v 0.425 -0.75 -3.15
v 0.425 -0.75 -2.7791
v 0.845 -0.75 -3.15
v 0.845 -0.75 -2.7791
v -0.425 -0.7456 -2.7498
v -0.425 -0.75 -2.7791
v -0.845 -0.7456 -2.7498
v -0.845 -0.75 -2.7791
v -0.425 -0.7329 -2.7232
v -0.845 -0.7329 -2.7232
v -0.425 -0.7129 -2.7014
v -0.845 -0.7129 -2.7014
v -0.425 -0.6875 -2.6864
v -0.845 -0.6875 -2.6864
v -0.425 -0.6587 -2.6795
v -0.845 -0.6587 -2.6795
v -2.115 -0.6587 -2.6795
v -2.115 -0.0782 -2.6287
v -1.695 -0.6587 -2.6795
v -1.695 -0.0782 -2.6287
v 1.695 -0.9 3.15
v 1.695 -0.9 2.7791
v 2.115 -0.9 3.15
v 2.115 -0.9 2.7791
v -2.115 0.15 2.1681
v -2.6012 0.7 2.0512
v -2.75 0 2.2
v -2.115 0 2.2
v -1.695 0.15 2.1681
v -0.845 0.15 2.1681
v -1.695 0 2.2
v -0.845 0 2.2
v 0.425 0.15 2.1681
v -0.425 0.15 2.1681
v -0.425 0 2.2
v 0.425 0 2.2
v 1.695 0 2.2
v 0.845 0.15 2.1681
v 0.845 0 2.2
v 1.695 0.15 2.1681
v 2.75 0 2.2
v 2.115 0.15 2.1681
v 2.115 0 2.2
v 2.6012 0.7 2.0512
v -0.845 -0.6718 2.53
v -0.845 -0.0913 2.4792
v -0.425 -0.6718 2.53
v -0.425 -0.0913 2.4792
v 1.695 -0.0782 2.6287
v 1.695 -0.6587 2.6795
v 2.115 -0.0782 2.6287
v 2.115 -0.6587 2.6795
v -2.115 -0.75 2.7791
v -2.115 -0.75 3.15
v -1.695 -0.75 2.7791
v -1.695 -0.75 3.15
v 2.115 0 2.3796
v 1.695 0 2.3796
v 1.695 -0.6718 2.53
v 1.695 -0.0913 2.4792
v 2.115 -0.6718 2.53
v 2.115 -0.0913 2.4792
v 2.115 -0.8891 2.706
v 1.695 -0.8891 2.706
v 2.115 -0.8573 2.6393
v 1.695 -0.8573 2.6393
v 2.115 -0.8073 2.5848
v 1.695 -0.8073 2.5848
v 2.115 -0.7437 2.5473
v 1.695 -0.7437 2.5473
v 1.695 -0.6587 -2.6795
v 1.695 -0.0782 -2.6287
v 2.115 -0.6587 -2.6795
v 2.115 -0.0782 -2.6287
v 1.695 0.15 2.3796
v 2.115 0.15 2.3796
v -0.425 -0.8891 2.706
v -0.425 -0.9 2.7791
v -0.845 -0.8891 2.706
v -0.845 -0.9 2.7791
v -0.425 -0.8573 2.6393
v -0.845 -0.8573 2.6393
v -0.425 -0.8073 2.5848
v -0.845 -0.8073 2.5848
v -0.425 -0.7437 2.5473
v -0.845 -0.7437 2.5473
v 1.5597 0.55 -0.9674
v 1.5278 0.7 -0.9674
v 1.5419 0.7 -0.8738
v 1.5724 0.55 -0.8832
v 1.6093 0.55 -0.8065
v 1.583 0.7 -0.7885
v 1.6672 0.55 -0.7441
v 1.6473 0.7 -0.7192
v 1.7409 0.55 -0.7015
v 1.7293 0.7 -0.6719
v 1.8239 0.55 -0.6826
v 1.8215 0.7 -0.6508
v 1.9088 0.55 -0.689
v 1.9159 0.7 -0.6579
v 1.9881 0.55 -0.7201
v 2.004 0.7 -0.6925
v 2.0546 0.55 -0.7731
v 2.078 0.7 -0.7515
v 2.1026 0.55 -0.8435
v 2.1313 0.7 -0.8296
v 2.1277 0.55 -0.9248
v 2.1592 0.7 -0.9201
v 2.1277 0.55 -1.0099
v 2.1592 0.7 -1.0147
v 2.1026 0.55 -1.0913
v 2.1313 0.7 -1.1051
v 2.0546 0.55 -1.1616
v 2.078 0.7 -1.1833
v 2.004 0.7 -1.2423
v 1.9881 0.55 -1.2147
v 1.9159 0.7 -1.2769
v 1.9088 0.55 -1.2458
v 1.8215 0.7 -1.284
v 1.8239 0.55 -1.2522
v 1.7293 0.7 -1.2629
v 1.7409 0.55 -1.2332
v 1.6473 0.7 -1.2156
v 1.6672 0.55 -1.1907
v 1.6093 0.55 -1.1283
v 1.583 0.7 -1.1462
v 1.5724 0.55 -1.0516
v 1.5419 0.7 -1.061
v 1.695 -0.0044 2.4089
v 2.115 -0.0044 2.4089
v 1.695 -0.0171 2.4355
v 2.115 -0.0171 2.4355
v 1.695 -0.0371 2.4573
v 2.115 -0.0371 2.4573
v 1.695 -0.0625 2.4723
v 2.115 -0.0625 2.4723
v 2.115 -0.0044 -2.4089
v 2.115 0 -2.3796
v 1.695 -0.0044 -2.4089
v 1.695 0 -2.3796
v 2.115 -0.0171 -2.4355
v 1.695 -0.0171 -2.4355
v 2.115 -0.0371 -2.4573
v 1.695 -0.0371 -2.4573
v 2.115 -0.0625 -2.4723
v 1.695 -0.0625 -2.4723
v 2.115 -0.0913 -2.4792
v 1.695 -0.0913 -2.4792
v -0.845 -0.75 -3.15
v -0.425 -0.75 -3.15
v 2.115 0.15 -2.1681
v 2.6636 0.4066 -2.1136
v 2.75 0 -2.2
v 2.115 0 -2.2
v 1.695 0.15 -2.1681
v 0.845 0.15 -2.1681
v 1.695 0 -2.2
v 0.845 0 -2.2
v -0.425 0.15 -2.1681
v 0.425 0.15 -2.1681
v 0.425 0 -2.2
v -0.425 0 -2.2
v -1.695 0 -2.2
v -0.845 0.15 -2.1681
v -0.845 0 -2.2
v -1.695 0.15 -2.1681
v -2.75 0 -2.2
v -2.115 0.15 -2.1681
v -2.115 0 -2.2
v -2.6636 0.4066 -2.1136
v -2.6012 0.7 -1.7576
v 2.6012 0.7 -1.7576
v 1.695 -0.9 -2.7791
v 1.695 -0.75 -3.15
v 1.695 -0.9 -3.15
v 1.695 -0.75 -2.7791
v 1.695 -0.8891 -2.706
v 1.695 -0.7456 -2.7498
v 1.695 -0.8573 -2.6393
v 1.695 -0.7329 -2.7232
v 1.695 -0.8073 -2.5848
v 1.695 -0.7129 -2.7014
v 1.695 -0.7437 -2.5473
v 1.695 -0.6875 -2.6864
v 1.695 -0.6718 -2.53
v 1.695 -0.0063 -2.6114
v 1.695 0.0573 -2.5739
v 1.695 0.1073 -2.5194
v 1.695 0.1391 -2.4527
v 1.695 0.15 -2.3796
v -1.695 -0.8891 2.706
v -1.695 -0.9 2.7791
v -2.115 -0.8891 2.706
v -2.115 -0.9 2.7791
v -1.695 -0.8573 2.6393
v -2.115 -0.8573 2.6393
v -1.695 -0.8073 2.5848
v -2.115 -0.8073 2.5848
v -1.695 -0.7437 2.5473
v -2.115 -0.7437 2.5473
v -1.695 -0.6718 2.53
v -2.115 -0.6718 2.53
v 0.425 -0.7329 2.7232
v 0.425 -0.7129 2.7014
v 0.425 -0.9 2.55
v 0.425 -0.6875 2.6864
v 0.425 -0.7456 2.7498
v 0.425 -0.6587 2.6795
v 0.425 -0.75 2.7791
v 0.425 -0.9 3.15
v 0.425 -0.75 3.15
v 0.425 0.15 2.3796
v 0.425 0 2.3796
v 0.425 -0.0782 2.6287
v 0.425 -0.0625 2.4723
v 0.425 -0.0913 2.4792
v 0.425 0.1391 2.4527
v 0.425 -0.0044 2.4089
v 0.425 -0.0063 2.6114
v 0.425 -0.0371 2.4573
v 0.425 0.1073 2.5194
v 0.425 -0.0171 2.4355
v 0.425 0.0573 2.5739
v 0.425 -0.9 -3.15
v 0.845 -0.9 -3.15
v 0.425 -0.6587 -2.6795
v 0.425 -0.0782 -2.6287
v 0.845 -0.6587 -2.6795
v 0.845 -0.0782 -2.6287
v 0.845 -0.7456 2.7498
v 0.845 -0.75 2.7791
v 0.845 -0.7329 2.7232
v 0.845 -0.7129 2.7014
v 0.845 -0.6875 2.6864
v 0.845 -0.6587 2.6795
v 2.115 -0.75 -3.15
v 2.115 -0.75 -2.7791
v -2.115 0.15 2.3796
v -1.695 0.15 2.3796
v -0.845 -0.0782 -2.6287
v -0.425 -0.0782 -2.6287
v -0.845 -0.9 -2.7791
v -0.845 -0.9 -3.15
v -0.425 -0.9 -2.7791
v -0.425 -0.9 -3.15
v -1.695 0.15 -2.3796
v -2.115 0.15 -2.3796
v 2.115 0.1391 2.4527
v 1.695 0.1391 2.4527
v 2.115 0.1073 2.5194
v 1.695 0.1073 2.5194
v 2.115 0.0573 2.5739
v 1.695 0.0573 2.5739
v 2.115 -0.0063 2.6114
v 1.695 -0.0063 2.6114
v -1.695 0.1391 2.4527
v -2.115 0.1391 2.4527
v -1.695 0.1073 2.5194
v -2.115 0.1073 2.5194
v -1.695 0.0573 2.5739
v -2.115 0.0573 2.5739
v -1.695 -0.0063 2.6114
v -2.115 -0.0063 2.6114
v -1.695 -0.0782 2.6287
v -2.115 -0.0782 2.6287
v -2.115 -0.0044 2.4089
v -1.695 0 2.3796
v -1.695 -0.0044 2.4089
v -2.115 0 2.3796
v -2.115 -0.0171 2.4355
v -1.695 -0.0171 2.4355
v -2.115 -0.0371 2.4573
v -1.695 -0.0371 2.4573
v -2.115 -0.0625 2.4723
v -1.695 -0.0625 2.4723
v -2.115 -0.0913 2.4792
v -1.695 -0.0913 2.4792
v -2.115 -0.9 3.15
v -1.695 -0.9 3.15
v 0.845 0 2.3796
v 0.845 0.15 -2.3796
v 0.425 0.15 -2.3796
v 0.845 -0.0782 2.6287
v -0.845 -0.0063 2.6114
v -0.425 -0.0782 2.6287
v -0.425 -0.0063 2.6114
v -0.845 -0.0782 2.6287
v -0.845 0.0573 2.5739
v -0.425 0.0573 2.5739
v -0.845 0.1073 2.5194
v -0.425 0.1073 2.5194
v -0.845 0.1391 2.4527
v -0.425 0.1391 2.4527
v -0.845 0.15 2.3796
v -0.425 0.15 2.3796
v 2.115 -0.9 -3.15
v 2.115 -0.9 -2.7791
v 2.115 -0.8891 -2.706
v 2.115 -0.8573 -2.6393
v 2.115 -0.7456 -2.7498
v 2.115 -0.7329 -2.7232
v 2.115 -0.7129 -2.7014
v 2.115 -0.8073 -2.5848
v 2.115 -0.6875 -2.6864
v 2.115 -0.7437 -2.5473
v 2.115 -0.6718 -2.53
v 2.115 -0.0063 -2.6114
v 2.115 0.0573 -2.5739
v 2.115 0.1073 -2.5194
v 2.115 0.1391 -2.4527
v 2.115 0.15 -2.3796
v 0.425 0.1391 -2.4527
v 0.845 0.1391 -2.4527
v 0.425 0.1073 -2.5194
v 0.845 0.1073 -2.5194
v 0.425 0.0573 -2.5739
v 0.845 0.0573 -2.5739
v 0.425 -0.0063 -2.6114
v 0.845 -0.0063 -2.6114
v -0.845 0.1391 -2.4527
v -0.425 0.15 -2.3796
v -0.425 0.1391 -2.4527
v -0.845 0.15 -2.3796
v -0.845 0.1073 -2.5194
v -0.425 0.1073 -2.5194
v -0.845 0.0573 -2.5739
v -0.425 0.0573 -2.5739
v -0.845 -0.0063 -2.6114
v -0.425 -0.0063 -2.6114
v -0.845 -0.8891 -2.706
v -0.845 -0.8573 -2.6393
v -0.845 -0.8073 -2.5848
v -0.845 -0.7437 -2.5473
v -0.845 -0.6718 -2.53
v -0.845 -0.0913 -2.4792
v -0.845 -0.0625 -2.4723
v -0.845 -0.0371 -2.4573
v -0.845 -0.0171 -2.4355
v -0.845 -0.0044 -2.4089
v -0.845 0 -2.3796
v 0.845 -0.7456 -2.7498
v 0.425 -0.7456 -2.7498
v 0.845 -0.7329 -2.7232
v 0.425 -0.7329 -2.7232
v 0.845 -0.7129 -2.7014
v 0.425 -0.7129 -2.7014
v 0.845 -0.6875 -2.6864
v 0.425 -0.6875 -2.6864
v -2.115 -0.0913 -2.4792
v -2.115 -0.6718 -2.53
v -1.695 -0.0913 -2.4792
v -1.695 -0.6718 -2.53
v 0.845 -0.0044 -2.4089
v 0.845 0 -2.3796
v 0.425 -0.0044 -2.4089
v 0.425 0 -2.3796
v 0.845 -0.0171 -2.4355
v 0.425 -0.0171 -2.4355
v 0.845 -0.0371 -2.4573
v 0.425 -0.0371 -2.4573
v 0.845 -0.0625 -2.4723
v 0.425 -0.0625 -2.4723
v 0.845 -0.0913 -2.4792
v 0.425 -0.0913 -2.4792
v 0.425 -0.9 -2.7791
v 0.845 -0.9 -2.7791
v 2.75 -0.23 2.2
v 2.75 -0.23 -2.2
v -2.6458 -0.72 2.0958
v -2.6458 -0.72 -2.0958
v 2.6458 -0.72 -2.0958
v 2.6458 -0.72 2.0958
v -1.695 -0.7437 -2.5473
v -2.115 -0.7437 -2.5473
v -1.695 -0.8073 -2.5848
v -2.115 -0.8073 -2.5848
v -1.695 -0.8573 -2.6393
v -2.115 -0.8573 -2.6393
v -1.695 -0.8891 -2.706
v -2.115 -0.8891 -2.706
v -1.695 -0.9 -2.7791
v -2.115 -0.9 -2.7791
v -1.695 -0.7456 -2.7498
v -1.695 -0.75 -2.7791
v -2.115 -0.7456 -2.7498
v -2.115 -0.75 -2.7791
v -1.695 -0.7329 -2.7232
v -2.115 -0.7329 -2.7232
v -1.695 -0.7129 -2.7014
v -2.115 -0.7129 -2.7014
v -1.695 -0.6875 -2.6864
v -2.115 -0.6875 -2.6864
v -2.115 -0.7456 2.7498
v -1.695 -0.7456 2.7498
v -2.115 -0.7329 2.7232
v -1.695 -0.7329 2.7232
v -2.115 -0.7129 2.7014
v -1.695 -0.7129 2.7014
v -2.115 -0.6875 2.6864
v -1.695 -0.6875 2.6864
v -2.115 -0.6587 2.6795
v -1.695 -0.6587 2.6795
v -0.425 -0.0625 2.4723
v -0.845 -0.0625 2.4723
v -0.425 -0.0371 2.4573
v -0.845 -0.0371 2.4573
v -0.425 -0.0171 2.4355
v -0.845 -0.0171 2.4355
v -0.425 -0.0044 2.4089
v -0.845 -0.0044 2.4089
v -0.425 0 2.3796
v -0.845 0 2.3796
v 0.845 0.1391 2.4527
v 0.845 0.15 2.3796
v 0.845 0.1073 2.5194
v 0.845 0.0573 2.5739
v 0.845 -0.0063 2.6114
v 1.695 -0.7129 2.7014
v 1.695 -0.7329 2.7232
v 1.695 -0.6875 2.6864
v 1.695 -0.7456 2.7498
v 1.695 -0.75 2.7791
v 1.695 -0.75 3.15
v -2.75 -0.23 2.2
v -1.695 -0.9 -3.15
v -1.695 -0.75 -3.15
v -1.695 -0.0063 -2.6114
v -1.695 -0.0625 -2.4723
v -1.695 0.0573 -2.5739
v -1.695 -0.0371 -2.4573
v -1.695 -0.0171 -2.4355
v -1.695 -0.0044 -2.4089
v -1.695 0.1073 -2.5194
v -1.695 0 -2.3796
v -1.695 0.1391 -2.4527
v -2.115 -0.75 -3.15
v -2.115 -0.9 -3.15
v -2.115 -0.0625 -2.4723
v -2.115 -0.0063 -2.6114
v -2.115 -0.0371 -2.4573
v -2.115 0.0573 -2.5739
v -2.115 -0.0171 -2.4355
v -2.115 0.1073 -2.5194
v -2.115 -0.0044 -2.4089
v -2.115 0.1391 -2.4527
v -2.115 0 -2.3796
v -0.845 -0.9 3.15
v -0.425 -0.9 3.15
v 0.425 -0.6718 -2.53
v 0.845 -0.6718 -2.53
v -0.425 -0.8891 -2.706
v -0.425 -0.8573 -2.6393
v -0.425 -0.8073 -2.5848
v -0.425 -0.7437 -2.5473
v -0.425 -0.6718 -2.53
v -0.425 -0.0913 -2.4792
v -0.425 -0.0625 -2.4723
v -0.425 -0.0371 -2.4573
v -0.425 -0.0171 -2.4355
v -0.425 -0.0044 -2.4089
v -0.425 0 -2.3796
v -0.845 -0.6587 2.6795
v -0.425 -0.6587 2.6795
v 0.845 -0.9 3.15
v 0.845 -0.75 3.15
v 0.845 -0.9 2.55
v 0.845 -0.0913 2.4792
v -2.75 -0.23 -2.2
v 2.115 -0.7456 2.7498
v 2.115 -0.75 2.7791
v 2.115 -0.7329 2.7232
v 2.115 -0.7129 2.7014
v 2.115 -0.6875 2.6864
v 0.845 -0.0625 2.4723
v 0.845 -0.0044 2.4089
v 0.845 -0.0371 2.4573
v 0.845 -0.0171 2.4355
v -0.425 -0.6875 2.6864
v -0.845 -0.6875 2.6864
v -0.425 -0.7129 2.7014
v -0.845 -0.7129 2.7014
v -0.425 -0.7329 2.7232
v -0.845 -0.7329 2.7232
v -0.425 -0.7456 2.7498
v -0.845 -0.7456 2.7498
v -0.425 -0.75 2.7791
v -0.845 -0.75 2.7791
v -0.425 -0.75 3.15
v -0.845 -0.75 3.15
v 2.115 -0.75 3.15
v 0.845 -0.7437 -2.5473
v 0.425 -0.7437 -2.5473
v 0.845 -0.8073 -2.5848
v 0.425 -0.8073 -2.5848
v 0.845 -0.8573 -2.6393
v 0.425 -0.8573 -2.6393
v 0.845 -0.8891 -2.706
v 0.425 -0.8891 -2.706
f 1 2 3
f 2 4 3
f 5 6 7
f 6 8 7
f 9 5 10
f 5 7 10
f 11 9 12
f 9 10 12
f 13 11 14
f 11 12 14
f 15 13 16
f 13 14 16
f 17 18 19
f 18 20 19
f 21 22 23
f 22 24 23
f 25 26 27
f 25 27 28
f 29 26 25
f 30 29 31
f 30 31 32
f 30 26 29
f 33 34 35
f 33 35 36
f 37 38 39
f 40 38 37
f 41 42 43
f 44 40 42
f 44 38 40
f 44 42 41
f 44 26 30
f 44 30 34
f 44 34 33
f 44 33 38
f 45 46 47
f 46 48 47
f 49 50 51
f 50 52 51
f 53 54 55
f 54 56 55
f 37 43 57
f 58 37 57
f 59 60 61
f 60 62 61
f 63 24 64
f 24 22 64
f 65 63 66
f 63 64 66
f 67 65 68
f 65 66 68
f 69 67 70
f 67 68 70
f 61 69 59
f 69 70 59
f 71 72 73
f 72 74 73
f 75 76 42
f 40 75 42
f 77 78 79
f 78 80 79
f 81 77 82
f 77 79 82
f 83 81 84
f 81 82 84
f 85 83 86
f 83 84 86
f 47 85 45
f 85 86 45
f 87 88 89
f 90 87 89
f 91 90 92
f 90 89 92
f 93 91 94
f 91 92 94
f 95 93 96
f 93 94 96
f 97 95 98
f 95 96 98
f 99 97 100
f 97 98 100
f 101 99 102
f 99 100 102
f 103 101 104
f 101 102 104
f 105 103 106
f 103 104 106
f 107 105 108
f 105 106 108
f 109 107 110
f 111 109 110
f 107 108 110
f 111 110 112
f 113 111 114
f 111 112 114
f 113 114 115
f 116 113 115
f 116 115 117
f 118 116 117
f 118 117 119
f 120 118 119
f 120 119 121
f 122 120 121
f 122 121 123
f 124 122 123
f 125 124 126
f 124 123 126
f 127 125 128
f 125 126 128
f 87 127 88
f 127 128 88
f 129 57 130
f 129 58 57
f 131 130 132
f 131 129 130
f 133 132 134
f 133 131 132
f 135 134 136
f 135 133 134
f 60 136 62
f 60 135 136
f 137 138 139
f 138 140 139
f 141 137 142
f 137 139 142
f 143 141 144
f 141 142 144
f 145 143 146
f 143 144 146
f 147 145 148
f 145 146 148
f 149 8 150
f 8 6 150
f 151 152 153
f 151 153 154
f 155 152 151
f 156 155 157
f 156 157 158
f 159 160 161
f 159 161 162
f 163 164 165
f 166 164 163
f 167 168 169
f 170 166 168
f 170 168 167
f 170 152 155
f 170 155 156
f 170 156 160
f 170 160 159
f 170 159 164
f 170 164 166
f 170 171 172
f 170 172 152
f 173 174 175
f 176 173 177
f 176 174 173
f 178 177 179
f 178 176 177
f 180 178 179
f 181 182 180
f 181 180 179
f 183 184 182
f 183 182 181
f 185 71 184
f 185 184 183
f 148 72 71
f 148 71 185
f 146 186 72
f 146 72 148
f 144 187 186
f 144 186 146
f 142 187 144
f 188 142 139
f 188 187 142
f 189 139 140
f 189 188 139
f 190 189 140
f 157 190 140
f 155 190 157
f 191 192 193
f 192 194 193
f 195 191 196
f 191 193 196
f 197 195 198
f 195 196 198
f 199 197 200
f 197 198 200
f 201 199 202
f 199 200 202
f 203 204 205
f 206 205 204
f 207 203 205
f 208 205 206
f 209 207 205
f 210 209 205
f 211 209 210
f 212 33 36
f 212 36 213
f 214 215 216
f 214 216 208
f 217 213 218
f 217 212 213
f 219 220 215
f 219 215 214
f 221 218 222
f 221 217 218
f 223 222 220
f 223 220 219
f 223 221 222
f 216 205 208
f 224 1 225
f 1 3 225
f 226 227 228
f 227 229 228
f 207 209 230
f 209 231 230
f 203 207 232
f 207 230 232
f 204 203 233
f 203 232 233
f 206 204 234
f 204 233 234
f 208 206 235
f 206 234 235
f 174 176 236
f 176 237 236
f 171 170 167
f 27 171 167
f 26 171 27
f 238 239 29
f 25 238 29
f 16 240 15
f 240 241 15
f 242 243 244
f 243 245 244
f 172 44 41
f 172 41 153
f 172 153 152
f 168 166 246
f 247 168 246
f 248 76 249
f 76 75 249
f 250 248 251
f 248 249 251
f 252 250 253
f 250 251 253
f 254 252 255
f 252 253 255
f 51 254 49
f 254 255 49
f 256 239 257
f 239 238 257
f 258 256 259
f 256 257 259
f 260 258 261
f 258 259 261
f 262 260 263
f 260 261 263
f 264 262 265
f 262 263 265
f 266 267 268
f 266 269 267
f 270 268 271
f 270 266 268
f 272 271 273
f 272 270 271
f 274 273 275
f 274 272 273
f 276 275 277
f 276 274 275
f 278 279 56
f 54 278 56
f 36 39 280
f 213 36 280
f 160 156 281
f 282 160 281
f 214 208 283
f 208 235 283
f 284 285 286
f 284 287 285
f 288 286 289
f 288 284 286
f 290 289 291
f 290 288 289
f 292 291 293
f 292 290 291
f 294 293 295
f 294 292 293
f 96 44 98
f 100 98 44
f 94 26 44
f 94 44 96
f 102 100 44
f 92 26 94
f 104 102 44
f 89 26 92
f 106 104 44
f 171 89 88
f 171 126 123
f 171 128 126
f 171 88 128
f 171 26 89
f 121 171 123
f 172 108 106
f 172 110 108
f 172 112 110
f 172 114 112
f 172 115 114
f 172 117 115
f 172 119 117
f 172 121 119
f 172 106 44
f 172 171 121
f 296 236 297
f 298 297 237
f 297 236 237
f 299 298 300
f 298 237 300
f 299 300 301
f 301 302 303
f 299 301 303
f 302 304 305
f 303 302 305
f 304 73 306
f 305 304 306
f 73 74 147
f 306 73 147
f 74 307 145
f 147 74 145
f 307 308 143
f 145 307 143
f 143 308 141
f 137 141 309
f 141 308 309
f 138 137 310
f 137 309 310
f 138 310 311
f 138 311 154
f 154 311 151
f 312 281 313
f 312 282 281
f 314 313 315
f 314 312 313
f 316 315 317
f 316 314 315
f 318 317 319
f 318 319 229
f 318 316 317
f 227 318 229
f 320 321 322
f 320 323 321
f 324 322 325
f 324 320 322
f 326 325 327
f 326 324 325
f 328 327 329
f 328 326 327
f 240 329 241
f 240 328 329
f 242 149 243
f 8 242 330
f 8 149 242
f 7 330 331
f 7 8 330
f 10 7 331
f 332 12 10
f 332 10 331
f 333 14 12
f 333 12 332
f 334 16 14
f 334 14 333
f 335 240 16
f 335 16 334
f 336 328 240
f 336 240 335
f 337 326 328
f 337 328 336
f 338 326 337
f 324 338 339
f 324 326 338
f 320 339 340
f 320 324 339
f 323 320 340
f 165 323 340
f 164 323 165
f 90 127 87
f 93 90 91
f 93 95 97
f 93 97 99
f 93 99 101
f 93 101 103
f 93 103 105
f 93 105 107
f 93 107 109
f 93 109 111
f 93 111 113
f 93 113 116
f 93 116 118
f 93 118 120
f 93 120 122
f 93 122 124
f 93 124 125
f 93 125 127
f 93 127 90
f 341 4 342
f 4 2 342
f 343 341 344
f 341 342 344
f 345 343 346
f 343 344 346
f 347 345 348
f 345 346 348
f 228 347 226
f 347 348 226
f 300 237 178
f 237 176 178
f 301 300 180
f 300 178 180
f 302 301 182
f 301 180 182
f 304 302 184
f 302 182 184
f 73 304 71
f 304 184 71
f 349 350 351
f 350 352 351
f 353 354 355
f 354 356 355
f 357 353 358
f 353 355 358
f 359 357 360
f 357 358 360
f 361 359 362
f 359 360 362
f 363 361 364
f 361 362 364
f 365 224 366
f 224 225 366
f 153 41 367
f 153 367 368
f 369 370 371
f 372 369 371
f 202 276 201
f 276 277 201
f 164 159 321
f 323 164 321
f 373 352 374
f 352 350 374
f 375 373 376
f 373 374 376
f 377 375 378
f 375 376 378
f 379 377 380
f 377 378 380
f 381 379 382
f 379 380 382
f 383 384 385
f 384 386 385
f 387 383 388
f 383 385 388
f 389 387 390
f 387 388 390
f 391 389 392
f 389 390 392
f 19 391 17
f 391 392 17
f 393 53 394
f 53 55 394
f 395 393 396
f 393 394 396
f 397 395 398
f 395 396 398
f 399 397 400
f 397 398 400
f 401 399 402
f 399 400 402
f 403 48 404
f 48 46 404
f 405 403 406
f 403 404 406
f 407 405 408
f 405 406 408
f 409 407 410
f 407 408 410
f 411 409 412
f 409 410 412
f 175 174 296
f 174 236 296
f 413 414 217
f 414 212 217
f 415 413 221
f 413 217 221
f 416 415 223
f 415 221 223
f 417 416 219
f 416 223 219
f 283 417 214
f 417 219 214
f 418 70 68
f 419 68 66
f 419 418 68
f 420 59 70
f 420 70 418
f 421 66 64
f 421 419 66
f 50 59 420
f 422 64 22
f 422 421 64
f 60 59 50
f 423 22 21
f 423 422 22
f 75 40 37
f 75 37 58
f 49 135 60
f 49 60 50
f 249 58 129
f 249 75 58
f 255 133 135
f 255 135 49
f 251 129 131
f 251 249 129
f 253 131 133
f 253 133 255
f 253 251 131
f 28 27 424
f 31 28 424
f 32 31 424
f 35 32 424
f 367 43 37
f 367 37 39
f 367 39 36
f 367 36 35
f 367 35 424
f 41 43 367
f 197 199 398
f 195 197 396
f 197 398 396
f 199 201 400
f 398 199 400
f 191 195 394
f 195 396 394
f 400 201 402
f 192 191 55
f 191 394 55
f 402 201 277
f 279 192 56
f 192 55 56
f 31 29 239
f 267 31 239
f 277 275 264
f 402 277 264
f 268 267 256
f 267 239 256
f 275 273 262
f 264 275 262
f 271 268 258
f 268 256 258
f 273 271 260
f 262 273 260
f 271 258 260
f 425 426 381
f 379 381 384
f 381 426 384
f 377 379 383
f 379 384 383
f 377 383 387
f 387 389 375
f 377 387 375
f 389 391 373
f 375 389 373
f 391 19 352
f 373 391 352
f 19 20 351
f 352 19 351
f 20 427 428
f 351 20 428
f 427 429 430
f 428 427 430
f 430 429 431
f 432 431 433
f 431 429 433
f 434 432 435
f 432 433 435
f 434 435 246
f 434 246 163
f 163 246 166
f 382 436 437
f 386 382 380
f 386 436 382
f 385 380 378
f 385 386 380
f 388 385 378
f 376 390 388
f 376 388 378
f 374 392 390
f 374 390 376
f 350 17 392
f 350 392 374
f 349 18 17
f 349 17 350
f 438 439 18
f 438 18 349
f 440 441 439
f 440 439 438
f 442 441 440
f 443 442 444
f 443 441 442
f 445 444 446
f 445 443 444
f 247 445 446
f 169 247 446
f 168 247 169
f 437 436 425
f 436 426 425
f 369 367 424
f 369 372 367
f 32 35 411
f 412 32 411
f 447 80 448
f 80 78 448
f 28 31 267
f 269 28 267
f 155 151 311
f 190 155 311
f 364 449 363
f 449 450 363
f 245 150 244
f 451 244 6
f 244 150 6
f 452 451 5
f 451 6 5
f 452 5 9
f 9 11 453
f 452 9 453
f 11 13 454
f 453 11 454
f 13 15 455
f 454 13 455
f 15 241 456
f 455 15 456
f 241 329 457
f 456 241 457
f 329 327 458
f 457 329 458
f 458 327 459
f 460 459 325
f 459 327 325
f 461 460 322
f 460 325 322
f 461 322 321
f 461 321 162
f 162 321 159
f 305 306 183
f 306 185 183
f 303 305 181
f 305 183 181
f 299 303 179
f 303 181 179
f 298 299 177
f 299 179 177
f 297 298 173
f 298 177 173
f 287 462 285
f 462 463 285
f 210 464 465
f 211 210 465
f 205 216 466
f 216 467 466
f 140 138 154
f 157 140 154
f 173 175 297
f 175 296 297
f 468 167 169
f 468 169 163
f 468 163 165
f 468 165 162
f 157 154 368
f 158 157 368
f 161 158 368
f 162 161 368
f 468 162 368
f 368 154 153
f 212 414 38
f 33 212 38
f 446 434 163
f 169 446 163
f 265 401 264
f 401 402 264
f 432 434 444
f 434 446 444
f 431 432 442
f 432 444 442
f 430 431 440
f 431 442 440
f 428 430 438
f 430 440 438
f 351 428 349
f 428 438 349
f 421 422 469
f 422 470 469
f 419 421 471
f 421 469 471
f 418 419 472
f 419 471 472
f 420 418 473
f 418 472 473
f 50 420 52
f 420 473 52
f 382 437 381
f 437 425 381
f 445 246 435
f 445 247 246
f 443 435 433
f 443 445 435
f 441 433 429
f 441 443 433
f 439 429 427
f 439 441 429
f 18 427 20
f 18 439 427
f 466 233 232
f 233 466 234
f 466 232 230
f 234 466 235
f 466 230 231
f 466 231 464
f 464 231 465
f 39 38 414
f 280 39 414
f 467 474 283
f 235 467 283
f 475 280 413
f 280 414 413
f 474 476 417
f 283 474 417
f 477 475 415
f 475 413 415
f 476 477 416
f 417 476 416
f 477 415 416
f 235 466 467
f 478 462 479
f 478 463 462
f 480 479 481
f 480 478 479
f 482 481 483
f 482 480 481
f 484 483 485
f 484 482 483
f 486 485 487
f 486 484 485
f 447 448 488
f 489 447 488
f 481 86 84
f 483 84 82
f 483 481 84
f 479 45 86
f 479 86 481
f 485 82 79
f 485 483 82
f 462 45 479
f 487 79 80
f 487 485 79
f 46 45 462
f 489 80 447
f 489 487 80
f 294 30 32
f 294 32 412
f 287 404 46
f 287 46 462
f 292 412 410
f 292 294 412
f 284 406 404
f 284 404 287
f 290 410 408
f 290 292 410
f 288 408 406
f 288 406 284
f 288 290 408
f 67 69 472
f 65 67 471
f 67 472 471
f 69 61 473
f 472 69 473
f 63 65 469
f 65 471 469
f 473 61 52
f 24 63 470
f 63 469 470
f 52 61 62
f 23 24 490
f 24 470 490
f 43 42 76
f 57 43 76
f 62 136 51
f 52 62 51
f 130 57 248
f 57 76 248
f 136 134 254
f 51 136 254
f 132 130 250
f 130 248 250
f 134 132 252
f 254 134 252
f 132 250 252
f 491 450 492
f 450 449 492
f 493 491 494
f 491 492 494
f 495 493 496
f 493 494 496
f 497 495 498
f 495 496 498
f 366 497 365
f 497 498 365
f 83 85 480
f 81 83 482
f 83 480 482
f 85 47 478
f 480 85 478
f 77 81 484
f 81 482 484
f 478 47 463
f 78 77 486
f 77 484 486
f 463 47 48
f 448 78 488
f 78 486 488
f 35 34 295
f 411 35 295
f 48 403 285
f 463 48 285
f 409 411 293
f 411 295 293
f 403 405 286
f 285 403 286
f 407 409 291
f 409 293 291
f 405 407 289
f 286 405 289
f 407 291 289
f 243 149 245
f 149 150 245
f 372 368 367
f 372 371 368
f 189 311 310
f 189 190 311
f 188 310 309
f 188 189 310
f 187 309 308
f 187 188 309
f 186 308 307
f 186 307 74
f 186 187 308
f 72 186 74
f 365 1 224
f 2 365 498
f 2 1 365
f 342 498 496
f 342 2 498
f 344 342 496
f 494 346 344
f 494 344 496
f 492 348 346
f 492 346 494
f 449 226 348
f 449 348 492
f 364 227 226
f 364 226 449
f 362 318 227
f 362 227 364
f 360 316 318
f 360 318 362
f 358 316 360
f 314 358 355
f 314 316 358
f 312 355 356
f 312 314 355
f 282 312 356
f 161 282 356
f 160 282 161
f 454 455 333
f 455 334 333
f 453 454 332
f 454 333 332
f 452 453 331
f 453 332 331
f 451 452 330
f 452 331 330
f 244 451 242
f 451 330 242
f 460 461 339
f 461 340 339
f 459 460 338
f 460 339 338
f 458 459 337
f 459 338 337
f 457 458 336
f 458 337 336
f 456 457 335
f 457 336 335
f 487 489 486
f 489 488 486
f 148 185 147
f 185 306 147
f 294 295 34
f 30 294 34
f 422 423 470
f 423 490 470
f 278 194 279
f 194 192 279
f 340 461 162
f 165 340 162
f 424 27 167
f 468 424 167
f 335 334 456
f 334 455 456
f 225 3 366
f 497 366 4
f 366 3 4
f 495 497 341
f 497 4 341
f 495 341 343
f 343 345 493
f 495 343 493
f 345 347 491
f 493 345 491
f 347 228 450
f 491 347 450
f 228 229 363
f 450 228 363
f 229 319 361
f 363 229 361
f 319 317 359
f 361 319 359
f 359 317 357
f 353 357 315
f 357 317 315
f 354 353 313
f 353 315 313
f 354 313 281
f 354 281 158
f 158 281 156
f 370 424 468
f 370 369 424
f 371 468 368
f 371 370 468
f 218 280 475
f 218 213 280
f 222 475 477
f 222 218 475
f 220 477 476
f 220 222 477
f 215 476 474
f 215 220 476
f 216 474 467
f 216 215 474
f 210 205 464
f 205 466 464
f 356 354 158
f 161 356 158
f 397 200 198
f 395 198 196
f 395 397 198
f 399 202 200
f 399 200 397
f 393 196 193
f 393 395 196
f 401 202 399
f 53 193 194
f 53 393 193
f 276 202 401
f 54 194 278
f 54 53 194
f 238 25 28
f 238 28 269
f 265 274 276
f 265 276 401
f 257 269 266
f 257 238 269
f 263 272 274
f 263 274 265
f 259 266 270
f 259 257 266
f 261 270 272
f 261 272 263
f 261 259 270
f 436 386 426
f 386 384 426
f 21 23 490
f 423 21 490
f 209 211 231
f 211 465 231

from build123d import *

# Parameters (mm, degrees)
SKETCH1_W                = 5.5
SKETCH1_H                = 4.4
EXTRUDE1_DEPTH           = 0.7
EXTRUDE1_TAPER           = 12
EXTRUDE1_OTHER_WAY_DEPTH = 0.23
SKETCH2_W                = 5.5
SKETCH2_H                = 4.4
EXTRUDE2_DEPTH           = 0.49
EXTRUDE2_TAPER           = 12
CHAMFER1_SIZE            = 0.29360287
CHAMFER1_SIZE_2          = 0.3
SKETCH3_R                = 0.317461986
CUT_EXTRUDE1_DEPTH       = 0.15
CUT_EXTRUDE1_DRAFT       = -12
EXTRUDE3_START           = 0.635
EXTRUDE3_DEPTH           = 0.21
LPATTERN3_COUNT          = 2
LPATTERN3_PITCH          = 1.27
LPATTERN3_COL_COUNT      = 3
LPATTERN3_COL_PITCH      = 1.27
FILLET1_R                = 0.1
FILLET2_R                = 0.25


with BuildPart() as part:
    # Sketch1 → Extrude1 (new body)
    with BuildSketch(Plane(origin=(0, 0, 0), x_dir=(1, 0, 0), z_dir=(0, 1, 0))):
        Rectangle(SKETCH1_W, SKETCH1_H)
    extrude(amount=EXTRUDE1_DEPTH, taper=EXTRUDE1_TAPER)

    # Sketch1 → Extrude1 other way (add)
    with BuildSketch(Plane(origin=(0, 0, 0), x_dir=(1, 0, 0), z_dir=(0, 1, 0))):
        Rectangle(SKETCH1_W, SKETCH1_H)
    extrude(amount=-EXTRUDE1_OTHER_WAY_DEPTH)

    # Sketch2 → Extrude2 (add)
    with BuildSketch(Plane.XZ.offset(0.23)):
        Rectangle(SKETCH2_W, SKETCH2_H)
    extrude(amount=EXTRUDE2_DEPTH, taper=EXTRUDE2_TAPER)

    # Chamfer1
    # the kernel refuses this chamfer: 0.3, 0.29360287 mm, written as the material it takes off along each edge
    with BuildSketch(Plane(origin=(3.374914076, 0.7, -2.051210407), x_dir=(0, 0.025194664498195945, 0.9996825640576229), z_dir=(-1, 0, 0))) as chamfer1_piece_1:
        Polygon((CHAMFER1_SIZE * 0.999682563914, -CHAMFER1_SIZE * 0.0251946644946), (-CHAMFER1_SIZE_2 * 0.232489792804, -CHAMFER1_SIZE_2 * 0.972598836233), (0, 0), align=None)
    extrude(amount=6.749828151, mode=Mode.SUBTRACT)


with BuildPart() as cut_extrude1_tool:
    # Sketch3 → Cut-Extrude1 (with draft: the straight prism first)
    with BuildSketch(Plane(origin=(0, 0.7, 0), x_dir=(-1, 0, 0), z_dir=(0, 1, 0))):
        with Locations((-1.845269249, -0.967381419)):
            Circle(SKETCH3_R)
    extrude(amount=-CUT_EXTRUDE1_DEPTH)
    # Cut-Extrude1: the draft: its side faces are tilted about the plane it starts from
    cut_extrude1_sides = [cut_extrude1_tool.faces().sort_by_distance(p)[0] for p in [
        (2.162731235, 0.625, -0.967381419),
    ]]
    draft(cut_extrude1_sides, Plane(origin=(0, 0.7, 0), x_dir=(-1, 0, 0), z_dir=(0, 1, 0)), CUT_EXTRUDE1_DRAFT)


with BuildPart() as part_1:
    add(part.part)

    # Cut-Extrude1: cut by cut_extrude1_tool
    add(cut_extrude1_tool.part, mode=Mode.SUBTRACT)

    # Sketch4 → Extrude3 (add, symmetric)
    with BuildSketch(Plane(origin=(0, 0, 0), x_dir=(0, 0, -1), z_dir=(1, 0, 0)).offset(EXTRUDE3_START)):
        Polygon((-2.687449676, -0.75), (-2.608709879, 0.15), (2.608709879, 0.15), (2.687449676, -0.75), (3.15, -0.75), (3.15, -0.9), (2.55, -0.9), (2.471260203, 0), (-2.471260203, 0), (-2.55, -0.9), (-3.15, -0.9), (-3.15, -0.75), align=None)
    extrude3 = extrude(amount=EXTRUDE3_DEPTH, both=True)

    # LPattern3: Extrude3 ×2
    with Locations(*[(i * LPATTERN3_PITCH, 0, 0) for i in range(1, LPATTERN3_COUNT)]):
        add(extrude3)

    # LPattern3 col: Extrude3 ×3
    with Locations(*[(-i * LPATTERN3_COL_PITCH, 0, 0) for i in range(1, LPATTERN3_COL_COUNT)]):
        add(extrude3)

    # Fillet1
    fillet1_edges = [part_1.edges().sort_by_distance(p)[0] for p in [
        (-0.635, -0.75, 2.687449676),
        (-0.635, 0, 2.471260203),
        (-0.635, 0, -2.471260203),
        (-1.905, -0.75, -2.687449676),
        (-1.905, -0.75, 2.687449676),
        (-1.905, 0, 2.471260203),
        (-1.905, 0, -2.471260203),
        (1.905, -0.75, -2.687449676),
        (1.905, -0.75, 2.687449676),
        (1.905, 0, 2.471260203),
        (1.905, 0, -2.471260203),
        (0.635, -0.75, -2.687449676),
        (0.635, -0.75, 2.687449676),
        (0.635, 0, 2.471260203),
        (0.635, 0, -2.471260203),
        (-0.635, -0.75, -2.687449676),
    ]]
    fillet(fillet1_edges, radius=FILLET1_R)

    # Fillet2
    fillet2_edges = [part_1.edges().sort_by_distance(p)[0] for p in [
        (-0.635, -0.9, 2.55),
        (-0.635, -0.9, -2.55),
        (-1.905, 0.15, -2.608709879),
        (-1.905, 0.15, 2.608709879),
        (-1.905, -0.9, 2.55),
        (-1.905, -0.9, -2.55),
        (1.905, 0.15, -2.608709879),
        (1.905, 0.15, 2.608709879),
        (1.905, -0.9, 2.55),
        (1.905, -0.9, -2.55),
        (0.635, 0.15, -2.608709879),
        (0.635, 0.15, 2.608709879),
        (0.635, -0.9, -2.55),
        (-0.635, 0.15, -2.608709879),
        (-0.635, 0.15, 2.608709879),
    ]]
    fillet(fillet2_edges, radius=FILLET2_R)


solid = part_1.part
